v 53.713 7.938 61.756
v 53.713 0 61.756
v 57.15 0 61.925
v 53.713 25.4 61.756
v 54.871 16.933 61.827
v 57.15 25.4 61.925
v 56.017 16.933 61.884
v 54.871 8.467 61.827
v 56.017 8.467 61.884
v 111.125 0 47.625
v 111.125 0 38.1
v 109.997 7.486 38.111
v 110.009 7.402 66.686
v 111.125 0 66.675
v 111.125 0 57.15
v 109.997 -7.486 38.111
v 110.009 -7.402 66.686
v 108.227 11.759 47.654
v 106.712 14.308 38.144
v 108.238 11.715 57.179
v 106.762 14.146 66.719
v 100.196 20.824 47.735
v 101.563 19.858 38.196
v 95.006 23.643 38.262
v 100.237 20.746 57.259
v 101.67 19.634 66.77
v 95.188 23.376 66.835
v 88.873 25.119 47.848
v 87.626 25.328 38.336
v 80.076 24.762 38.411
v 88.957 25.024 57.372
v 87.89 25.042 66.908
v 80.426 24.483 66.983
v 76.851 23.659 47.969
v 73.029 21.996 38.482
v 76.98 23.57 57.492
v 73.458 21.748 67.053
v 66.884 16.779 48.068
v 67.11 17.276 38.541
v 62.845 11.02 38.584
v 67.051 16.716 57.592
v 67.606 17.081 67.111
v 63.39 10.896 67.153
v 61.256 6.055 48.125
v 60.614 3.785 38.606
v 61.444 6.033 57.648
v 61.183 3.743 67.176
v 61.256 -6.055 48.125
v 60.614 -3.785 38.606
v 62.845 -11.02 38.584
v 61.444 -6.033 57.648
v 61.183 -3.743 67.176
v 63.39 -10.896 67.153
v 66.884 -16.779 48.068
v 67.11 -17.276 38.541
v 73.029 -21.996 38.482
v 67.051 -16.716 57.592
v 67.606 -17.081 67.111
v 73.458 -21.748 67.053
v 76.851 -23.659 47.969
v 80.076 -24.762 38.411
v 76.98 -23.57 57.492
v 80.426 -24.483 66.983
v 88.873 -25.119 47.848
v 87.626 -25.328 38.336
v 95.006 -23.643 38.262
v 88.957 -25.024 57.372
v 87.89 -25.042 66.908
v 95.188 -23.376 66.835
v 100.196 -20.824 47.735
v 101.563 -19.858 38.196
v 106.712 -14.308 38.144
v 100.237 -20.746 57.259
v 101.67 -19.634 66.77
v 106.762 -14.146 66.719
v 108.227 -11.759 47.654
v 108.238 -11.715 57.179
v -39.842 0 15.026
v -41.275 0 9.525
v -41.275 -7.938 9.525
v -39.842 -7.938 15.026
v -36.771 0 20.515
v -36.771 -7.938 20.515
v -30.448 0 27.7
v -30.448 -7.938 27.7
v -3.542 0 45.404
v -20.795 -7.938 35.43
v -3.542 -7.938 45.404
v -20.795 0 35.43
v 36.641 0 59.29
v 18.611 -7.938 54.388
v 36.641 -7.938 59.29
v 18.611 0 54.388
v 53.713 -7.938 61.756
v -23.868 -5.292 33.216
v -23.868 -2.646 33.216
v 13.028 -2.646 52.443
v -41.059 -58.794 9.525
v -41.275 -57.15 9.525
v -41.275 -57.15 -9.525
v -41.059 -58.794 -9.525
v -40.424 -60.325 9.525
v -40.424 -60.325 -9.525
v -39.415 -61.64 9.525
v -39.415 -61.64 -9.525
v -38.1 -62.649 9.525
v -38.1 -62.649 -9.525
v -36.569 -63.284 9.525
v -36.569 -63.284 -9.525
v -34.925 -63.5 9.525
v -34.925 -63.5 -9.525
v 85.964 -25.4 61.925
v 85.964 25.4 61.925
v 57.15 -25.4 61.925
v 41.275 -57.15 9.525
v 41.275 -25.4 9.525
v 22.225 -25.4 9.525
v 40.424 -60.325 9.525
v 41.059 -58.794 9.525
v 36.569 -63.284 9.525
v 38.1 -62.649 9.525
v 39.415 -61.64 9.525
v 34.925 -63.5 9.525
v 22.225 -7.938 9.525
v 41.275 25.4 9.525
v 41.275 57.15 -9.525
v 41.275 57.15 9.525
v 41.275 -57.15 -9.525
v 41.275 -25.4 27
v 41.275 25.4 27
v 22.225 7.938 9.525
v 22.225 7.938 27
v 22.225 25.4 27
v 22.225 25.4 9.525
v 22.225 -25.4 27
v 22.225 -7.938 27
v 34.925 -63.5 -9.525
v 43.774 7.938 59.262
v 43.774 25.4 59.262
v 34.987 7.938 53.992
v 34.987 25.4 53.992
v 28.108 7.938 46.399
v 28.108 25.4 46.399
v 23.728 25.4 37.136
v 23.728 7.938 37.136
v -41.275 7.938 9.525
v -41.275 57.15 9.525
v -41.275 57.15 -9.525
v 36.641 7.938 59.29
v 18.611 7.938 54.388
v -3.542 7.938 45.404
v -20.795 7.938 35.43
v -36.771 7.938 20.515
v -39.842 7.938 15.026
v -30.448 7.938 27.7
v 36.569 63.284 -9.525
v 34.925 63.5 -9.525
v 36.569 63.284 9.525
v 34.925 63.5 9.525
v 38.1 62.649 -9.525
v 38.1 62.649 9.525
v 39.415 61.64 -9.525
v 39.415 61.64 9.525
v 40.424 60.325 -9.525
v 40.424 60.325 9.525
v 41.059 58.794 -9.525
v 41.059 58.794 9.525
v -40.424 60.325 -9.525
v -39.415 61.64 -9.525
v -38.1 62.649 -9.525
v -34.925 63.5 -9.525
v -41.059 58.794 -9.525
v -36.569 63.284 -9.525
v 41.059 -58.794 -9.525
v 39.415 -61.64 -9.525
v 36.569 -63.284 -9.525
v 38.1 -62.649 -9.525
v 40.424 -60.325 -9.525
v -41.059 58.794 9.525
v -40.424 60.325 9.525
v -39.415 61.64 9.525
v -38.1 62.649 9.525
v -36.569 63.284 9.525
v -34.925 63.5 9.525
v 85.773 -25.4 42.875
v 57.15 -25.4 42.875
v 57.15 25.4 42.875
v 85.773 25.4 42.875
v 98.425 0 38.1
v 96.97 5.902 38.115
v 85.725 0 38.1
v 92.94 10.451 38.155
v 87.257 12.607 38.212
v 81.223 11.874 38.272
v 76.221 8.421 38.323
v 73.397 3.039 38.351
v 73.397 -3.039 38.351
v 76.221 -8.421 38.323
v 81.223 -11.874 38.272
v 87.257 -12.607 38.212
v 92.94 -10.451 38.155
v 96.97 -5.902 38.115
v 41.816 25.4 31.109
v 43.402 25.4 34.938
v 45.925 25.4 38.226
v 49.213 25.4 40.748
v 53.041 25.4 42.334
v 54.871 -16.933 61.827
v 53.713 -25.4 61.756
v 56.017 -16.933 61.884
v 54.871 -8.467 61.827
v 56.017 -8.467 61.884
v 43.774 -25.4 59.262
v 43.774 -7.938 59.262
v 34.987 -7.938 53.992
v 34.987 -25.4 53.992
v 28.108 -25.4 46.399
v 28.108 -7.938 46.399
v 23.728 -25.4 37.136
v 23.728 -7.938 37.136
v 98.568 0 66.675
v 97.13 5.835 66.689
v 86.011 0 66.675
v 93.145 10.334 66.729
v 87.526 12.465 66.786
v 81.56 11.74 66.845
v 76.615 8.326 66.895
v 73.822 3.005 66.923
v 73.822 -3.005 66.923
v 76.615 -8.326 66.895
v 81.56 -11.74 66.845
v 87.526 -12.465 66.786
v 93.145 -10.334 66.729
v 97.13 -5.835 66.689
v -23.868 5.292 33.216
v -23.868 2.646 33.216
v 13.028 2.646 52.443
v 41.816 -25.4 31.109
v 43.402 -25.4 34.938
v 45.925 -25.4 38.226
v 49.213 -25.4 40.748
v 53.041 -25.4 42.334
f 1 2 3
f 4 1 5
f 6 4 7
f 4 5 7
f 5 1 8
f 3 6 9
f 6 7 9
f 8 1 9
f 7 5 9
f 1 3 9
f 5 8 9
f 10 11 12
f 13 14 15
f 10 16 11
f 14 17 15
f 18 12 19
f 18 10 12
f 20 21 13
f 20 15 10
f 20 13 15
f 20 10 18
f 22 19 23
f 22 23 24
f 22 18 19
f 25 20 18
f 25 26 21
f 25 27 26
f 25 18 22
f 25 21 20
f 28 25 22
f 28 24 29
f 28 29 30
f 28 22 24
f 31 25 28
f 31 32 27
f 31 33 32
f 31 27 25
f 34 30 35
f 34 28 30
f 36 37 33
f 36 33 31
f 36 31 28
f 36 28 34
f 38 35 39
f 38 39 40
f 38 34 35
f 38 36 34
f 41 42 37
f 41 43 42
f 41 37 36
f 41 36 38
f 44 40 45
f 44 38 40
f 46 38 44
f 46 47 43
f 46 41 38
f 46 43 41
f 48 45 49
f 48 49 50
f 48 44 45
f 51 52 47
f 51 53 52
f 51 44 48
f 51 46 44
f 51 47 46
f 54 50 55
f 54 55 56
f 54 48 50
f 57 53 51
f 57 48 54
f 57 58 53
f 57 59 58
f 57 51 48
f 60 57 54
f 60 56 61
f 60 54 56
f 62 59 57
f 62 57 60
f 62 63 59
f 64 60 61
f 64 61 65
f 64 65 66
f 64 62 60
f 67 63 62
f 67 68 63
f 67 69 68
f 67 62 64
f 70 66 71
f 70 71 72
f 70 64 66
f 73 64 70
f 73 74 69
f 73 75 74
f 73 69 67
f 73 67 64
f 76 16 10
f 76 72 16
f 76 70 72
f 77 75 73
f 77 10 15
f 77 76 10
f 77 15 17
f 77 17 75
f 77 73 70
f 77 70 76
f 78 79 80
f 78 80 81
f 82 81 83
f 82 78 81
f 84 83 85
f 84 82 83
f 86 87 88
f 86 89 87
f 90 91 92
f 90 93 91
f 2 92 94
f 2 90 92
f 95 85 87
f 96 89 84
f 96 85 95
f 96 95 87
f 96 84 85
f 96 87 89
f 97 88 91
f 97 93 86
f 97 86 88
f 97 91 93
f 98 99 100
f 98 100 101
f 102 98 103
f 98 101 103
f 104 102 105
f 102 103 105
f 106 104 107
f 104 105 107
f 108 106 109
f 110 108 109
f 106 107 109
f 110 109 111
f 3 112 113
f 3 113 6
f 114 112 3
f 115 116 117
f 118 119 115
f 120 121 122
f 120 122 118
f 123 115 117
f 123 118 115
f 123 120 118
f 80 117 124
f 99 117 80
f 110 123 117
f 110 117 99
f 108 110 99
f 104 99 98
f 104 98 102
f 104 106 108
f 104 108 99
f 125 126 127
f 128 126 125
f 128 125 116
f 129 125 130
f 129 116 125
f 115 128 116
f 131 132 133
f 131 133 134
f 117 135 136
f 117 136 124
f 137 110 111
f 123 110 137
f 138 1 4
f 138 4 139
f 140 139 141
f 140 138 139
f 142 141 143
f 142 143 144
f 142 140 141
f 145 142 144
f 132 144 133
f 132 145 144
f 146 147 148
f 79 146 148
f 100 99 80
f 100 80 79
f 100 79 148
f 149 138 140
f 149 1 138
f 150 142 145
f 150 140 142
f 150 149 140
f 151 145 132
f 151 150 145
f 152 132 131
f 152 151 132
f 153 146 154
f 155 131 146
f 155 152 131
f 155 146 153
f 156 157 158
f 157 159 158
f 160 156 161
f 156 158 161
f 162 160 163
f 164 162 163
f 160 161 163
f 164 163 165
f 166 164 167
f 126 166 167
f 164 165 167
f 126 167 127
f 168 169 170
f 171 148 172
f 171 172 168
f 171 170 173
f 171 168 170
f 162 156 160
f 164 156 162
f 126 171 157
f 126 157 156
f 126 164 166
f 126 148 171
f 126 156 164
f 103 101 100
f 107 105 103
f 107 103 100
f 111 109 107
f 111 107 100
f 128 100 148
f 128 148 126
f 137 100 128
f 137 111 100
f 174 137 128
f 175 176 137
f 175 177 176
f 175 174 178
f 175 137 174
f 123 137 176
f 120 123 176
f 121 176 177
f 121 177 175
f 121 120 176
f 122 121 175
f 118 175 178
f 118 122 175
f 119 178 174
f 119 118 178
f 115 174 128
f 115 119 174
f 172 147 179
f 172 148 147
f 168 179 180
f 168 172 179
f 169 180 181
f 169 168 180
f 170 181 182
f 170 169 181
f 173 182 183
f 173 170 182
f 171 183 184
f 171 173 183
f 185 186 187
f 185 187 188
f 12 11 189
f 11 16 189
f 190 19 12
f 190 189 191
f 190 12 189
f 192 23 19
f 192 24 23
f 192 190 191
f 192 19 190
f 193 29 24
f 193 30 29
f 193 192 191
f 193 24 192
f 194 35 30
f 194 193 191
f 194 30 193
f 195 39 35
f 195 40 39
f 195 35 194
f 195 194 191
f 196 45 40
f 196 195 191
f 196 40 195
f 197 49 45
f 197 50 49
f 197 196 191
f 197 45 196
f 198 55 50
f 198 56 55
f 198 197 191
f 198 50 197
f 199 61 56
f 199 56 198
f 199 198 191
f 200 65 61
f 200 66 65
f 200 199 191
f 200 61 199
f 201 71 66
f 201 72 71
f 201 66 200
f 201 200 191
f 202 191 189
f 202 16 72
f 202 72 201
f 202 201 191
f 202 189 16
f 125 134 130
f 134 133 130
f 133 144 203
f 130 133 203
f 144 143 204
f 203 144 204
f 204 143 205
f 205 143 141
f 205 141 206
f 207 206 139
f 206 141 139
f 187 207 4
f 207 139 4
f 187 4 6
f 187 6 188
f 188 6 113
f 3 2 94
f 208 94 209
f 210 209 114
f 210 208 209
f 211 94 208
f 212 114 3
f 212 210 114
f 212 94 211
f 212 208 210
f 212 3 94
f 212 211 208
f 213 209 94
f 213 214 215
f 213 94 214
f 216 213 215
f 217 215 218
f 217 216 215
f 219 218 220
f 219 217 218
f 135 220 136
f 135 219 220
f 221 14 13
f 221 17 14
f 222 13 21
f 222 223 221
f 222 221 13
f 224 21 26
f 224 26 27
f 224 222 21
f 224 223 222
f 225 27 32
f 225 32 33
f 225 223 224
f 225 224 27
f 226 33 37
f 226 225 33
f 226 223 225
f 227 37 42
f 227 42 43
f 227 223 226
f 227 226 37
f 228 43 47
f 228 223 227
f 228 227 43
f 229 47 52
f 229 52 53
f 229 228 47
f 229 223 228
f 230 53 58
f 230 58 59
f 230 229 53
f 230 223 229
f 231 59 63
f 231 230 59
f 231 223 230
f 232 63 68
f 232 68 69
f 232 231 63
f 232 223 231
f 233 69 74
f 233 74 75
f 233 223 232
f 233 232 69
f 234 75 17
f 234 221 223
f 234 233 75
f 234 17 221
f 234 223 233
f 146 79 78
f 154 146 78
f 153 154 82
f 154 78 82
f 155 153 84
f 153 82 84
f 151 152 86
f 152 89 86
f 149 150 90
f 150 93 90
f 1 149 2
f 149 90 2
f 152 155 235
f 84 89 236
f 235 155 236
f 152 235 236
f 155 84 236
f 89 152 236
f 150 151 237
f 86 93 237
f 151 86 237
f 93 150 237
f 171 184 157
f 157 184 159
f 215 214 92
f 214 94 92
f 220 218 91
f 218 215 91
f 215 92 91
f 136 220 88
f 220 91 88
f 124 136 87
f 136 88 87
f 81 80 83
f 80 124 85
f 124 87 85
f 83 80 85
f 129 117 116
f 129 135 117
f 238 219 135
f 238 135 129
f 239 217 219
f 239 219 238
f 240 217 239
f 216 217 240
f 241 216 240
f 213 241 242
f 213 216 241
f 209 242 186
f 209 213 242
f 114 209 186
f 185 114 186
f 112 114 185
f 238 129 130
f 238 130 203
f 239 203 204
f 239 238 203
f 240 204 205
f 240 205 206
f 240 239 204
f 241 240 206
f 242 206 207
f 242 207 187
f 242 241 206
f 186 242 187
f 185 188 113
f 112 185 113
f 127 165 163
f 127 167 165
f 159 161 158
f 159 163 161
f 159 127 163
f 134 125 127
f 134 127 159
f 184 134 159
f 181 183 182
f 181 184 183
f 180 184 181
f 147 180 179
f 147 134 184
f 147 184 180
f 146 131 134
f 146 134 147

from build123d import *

# Parameters (mm, degrees)
F1_DEPTH = 63.5
F2_DEPTH = 25.4
F3_DEPTH = 7.9375
F5_R     = 6.35


with BuildPart() as f1:
    # F0 (on Front) → F1 (new body, symmetric)
    with BuildSketch(Plane.XZ):
        Polygon((-41.275, 9.525), (-41.275, -9.525), (41.275, -9.525), (41.275, 9.525), (22.225, 9.525), align=None)
    extrude(amount=F1_DEPTH, both=True)

    # F0 (on Front) → F2 (join, symmetric)
    with BuildSketch(Plane.XZ):
        with BuildLine():
            Line((22.225, 9.525), (41.275, 9.525))
            Line((41.275, 9.525), (41.275, 27.0002))
            ThreePointArc((41.275, 27.0002), (45.9246798487, 38.2255201513), (57.15, 42.8752))
            Line((57.15, 42.8752), (60.325, 42.8752))
            Line((60.325, 42.8752), (60.325, 61.9252))
            Line((60.325, 61.9252), (57.15, 61.9252))
            add(Edge.make_bspline(
                [(53.7127996904, 61.7556496307), (54.8765985811, 61.8347933422), (56.0230447647, 61.8915575095), (57.15, 61.9252)],
                knots=[108.134720886, 108.134720886, 108.134720886, 108.134720886, 111.5045361635, 111.5045361635, 111.5045361635, 111.5045361635], degree=3))
            ThreePointArc((53.7127996904, 61.7556496307), (31.2675750188, 50.4492021556), (22.225, 27.0002))
            Line((22.225, 27.0002), (22.225, 9.525))
        make_face()
        Polygon((85.9637896686, 61.9252), (60.325, 61.9252), (60.325, 42.8752), (85.772859763, 42.8752), align=None)
    extrude(amount=F2_DEPTH, both=True)

    # F0 (on Front) → F3 (join, symmetric)
    with BuildSketch(Plane.XZ):
        with BuildLine():
            add(Edge.make_bspline(
                [(-41.275, 9.525), (-38.8463697033, 33.6317201316), (16.3674089648, 59.2159901983), (53.7127996904, 61.7556496307)],
                knots=[0, 0, 0, 0, 108.134720886, 108.134720886, 108.134720886, 108.134720886], degree=3))
            Line((-41.275, 9.525), (22.225, 9.525))
            Line((22.225, 9.525), (22.225, 27.0002))
            ThreePointArc((22.225, 27.0002), (31.2675750188, 50.4492021556), (53.7127996904, 61.7556496307))
        make_face()
    extrude(amount=F3_DEPTH, both=True)

    # F5
    f5_edges = [f1.edges().sort_by_distance(p)[0] for p in [
        (-41.275, -63.5, 0),
        (41.275, -63.5, 0),
        (41.275, 63.5, 0),
        (-41.275, 63.5, 0),
    ]]
    fillet(f5_edges, radius=F5_R)


with BuildPart() as f4:
    # F0 (on Front) → F4 (revolve)
    with BuildSketch(Plane.XZ):
        Polygon((86.0113948584, 66.675), (85.9637896686, 61.9252), (85.772859763, 42.8752), (85.725, 38.1), (111.125, 38.1), (111.125, 66.675), align=None)
    revolve(axis=Axis((85.8681974292, 0, 52.3875), (0.0100220639, 0, 0.9999497779)))


solid = Compound([f1.part, f4.part])
